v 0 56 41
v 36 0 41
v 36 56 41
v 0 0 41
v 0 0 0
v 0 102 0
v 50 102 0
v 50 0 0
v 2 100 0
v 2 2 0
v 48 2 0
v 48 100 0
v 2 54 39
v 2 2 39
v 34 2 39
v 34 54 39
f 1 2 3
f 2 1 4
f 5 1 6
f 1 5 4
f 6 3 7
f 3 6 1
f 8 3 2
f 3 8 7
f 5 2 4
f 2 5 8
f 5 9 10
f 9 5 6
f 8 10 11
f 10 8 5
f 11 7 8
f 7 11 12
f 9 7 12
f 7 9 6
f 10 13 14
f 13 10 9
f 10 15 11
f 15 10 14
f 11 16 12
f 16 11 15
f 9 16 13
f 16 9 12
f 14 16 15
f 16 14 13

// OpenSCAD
module adapter_case(ux, uy, lx, ly, h, w) {
    polyhedron(
        points=[
            // top outer
            [0, 0, h],
            [0, uy, h],
            [ux, uy, h],
            [ux, 0, h],

            // bottom outer
            [0, 0, 0],
            [0, ly, 0],
            [lx, ly, 0],
            [lx, 0, 0],

            // bottom inner
            [w, w, 0],
            [w, ly-w, 0],
            [lx-w, ly-w, 0],
            [lx-w, w, 0],

            // top inner
            [w, w, h-w],
            [w, uy-w, h-w],
            [ux-w, uy-w, h-w],
            [ux-w, w, h-w],
        ],
        faces=[
            // top
            [0, 1, 2, 3],

            // outer sides
            [4, 5, 1, 0],
            [5, 6, 2, 1],
            [2, 6, 7, 3],
            [3, 7, 4, 0],

            // bottom sides
            [5, 4, 8, 9],
            [4, 7, 11, 8],
            [7, 6, 10, 11],
            [6, 5, 9, 10],

            // inner sides
            [8, 12, 13, 9],
            [8, 11, 15, 12],
            [11, 10, 14, 15],
            [9, 13, 14, 10],

            // bottom
            [12, 15, 14, 13],
        ]
    );

    // translate([0, 0, 0])
    //   text("4", 5);
    // translate([0, ly, 0])
    //   text("5", 5);
    // translate([lx, ly, 0])
    //   text("6", 5);
    // translate([lx, 0, 0])
    //   text("7", 5);

    // translate([w, w, 0])
    //   text("8", 5);
    // translate([w, ly-w, 0])
    //   text("9", 5);
    // translate([lx-w, ly-w, 0])
    //   text("10", 5);
    // translate([lx-w, w, 0])
    //   text("11", 5);

    // translate([w, w, h-w])
    //   text("12", 5);
    // translate([w, uy-w, h-w])
    //   text("13", 5);
    // translate([ux-w, uy-w, h-w])
    //   text("14", 5);
    // translate([ux-w, w, h-w])
    //   text("15", 5);
}

adapter_case(36, 56, 50, 102, 19+22, 2);
